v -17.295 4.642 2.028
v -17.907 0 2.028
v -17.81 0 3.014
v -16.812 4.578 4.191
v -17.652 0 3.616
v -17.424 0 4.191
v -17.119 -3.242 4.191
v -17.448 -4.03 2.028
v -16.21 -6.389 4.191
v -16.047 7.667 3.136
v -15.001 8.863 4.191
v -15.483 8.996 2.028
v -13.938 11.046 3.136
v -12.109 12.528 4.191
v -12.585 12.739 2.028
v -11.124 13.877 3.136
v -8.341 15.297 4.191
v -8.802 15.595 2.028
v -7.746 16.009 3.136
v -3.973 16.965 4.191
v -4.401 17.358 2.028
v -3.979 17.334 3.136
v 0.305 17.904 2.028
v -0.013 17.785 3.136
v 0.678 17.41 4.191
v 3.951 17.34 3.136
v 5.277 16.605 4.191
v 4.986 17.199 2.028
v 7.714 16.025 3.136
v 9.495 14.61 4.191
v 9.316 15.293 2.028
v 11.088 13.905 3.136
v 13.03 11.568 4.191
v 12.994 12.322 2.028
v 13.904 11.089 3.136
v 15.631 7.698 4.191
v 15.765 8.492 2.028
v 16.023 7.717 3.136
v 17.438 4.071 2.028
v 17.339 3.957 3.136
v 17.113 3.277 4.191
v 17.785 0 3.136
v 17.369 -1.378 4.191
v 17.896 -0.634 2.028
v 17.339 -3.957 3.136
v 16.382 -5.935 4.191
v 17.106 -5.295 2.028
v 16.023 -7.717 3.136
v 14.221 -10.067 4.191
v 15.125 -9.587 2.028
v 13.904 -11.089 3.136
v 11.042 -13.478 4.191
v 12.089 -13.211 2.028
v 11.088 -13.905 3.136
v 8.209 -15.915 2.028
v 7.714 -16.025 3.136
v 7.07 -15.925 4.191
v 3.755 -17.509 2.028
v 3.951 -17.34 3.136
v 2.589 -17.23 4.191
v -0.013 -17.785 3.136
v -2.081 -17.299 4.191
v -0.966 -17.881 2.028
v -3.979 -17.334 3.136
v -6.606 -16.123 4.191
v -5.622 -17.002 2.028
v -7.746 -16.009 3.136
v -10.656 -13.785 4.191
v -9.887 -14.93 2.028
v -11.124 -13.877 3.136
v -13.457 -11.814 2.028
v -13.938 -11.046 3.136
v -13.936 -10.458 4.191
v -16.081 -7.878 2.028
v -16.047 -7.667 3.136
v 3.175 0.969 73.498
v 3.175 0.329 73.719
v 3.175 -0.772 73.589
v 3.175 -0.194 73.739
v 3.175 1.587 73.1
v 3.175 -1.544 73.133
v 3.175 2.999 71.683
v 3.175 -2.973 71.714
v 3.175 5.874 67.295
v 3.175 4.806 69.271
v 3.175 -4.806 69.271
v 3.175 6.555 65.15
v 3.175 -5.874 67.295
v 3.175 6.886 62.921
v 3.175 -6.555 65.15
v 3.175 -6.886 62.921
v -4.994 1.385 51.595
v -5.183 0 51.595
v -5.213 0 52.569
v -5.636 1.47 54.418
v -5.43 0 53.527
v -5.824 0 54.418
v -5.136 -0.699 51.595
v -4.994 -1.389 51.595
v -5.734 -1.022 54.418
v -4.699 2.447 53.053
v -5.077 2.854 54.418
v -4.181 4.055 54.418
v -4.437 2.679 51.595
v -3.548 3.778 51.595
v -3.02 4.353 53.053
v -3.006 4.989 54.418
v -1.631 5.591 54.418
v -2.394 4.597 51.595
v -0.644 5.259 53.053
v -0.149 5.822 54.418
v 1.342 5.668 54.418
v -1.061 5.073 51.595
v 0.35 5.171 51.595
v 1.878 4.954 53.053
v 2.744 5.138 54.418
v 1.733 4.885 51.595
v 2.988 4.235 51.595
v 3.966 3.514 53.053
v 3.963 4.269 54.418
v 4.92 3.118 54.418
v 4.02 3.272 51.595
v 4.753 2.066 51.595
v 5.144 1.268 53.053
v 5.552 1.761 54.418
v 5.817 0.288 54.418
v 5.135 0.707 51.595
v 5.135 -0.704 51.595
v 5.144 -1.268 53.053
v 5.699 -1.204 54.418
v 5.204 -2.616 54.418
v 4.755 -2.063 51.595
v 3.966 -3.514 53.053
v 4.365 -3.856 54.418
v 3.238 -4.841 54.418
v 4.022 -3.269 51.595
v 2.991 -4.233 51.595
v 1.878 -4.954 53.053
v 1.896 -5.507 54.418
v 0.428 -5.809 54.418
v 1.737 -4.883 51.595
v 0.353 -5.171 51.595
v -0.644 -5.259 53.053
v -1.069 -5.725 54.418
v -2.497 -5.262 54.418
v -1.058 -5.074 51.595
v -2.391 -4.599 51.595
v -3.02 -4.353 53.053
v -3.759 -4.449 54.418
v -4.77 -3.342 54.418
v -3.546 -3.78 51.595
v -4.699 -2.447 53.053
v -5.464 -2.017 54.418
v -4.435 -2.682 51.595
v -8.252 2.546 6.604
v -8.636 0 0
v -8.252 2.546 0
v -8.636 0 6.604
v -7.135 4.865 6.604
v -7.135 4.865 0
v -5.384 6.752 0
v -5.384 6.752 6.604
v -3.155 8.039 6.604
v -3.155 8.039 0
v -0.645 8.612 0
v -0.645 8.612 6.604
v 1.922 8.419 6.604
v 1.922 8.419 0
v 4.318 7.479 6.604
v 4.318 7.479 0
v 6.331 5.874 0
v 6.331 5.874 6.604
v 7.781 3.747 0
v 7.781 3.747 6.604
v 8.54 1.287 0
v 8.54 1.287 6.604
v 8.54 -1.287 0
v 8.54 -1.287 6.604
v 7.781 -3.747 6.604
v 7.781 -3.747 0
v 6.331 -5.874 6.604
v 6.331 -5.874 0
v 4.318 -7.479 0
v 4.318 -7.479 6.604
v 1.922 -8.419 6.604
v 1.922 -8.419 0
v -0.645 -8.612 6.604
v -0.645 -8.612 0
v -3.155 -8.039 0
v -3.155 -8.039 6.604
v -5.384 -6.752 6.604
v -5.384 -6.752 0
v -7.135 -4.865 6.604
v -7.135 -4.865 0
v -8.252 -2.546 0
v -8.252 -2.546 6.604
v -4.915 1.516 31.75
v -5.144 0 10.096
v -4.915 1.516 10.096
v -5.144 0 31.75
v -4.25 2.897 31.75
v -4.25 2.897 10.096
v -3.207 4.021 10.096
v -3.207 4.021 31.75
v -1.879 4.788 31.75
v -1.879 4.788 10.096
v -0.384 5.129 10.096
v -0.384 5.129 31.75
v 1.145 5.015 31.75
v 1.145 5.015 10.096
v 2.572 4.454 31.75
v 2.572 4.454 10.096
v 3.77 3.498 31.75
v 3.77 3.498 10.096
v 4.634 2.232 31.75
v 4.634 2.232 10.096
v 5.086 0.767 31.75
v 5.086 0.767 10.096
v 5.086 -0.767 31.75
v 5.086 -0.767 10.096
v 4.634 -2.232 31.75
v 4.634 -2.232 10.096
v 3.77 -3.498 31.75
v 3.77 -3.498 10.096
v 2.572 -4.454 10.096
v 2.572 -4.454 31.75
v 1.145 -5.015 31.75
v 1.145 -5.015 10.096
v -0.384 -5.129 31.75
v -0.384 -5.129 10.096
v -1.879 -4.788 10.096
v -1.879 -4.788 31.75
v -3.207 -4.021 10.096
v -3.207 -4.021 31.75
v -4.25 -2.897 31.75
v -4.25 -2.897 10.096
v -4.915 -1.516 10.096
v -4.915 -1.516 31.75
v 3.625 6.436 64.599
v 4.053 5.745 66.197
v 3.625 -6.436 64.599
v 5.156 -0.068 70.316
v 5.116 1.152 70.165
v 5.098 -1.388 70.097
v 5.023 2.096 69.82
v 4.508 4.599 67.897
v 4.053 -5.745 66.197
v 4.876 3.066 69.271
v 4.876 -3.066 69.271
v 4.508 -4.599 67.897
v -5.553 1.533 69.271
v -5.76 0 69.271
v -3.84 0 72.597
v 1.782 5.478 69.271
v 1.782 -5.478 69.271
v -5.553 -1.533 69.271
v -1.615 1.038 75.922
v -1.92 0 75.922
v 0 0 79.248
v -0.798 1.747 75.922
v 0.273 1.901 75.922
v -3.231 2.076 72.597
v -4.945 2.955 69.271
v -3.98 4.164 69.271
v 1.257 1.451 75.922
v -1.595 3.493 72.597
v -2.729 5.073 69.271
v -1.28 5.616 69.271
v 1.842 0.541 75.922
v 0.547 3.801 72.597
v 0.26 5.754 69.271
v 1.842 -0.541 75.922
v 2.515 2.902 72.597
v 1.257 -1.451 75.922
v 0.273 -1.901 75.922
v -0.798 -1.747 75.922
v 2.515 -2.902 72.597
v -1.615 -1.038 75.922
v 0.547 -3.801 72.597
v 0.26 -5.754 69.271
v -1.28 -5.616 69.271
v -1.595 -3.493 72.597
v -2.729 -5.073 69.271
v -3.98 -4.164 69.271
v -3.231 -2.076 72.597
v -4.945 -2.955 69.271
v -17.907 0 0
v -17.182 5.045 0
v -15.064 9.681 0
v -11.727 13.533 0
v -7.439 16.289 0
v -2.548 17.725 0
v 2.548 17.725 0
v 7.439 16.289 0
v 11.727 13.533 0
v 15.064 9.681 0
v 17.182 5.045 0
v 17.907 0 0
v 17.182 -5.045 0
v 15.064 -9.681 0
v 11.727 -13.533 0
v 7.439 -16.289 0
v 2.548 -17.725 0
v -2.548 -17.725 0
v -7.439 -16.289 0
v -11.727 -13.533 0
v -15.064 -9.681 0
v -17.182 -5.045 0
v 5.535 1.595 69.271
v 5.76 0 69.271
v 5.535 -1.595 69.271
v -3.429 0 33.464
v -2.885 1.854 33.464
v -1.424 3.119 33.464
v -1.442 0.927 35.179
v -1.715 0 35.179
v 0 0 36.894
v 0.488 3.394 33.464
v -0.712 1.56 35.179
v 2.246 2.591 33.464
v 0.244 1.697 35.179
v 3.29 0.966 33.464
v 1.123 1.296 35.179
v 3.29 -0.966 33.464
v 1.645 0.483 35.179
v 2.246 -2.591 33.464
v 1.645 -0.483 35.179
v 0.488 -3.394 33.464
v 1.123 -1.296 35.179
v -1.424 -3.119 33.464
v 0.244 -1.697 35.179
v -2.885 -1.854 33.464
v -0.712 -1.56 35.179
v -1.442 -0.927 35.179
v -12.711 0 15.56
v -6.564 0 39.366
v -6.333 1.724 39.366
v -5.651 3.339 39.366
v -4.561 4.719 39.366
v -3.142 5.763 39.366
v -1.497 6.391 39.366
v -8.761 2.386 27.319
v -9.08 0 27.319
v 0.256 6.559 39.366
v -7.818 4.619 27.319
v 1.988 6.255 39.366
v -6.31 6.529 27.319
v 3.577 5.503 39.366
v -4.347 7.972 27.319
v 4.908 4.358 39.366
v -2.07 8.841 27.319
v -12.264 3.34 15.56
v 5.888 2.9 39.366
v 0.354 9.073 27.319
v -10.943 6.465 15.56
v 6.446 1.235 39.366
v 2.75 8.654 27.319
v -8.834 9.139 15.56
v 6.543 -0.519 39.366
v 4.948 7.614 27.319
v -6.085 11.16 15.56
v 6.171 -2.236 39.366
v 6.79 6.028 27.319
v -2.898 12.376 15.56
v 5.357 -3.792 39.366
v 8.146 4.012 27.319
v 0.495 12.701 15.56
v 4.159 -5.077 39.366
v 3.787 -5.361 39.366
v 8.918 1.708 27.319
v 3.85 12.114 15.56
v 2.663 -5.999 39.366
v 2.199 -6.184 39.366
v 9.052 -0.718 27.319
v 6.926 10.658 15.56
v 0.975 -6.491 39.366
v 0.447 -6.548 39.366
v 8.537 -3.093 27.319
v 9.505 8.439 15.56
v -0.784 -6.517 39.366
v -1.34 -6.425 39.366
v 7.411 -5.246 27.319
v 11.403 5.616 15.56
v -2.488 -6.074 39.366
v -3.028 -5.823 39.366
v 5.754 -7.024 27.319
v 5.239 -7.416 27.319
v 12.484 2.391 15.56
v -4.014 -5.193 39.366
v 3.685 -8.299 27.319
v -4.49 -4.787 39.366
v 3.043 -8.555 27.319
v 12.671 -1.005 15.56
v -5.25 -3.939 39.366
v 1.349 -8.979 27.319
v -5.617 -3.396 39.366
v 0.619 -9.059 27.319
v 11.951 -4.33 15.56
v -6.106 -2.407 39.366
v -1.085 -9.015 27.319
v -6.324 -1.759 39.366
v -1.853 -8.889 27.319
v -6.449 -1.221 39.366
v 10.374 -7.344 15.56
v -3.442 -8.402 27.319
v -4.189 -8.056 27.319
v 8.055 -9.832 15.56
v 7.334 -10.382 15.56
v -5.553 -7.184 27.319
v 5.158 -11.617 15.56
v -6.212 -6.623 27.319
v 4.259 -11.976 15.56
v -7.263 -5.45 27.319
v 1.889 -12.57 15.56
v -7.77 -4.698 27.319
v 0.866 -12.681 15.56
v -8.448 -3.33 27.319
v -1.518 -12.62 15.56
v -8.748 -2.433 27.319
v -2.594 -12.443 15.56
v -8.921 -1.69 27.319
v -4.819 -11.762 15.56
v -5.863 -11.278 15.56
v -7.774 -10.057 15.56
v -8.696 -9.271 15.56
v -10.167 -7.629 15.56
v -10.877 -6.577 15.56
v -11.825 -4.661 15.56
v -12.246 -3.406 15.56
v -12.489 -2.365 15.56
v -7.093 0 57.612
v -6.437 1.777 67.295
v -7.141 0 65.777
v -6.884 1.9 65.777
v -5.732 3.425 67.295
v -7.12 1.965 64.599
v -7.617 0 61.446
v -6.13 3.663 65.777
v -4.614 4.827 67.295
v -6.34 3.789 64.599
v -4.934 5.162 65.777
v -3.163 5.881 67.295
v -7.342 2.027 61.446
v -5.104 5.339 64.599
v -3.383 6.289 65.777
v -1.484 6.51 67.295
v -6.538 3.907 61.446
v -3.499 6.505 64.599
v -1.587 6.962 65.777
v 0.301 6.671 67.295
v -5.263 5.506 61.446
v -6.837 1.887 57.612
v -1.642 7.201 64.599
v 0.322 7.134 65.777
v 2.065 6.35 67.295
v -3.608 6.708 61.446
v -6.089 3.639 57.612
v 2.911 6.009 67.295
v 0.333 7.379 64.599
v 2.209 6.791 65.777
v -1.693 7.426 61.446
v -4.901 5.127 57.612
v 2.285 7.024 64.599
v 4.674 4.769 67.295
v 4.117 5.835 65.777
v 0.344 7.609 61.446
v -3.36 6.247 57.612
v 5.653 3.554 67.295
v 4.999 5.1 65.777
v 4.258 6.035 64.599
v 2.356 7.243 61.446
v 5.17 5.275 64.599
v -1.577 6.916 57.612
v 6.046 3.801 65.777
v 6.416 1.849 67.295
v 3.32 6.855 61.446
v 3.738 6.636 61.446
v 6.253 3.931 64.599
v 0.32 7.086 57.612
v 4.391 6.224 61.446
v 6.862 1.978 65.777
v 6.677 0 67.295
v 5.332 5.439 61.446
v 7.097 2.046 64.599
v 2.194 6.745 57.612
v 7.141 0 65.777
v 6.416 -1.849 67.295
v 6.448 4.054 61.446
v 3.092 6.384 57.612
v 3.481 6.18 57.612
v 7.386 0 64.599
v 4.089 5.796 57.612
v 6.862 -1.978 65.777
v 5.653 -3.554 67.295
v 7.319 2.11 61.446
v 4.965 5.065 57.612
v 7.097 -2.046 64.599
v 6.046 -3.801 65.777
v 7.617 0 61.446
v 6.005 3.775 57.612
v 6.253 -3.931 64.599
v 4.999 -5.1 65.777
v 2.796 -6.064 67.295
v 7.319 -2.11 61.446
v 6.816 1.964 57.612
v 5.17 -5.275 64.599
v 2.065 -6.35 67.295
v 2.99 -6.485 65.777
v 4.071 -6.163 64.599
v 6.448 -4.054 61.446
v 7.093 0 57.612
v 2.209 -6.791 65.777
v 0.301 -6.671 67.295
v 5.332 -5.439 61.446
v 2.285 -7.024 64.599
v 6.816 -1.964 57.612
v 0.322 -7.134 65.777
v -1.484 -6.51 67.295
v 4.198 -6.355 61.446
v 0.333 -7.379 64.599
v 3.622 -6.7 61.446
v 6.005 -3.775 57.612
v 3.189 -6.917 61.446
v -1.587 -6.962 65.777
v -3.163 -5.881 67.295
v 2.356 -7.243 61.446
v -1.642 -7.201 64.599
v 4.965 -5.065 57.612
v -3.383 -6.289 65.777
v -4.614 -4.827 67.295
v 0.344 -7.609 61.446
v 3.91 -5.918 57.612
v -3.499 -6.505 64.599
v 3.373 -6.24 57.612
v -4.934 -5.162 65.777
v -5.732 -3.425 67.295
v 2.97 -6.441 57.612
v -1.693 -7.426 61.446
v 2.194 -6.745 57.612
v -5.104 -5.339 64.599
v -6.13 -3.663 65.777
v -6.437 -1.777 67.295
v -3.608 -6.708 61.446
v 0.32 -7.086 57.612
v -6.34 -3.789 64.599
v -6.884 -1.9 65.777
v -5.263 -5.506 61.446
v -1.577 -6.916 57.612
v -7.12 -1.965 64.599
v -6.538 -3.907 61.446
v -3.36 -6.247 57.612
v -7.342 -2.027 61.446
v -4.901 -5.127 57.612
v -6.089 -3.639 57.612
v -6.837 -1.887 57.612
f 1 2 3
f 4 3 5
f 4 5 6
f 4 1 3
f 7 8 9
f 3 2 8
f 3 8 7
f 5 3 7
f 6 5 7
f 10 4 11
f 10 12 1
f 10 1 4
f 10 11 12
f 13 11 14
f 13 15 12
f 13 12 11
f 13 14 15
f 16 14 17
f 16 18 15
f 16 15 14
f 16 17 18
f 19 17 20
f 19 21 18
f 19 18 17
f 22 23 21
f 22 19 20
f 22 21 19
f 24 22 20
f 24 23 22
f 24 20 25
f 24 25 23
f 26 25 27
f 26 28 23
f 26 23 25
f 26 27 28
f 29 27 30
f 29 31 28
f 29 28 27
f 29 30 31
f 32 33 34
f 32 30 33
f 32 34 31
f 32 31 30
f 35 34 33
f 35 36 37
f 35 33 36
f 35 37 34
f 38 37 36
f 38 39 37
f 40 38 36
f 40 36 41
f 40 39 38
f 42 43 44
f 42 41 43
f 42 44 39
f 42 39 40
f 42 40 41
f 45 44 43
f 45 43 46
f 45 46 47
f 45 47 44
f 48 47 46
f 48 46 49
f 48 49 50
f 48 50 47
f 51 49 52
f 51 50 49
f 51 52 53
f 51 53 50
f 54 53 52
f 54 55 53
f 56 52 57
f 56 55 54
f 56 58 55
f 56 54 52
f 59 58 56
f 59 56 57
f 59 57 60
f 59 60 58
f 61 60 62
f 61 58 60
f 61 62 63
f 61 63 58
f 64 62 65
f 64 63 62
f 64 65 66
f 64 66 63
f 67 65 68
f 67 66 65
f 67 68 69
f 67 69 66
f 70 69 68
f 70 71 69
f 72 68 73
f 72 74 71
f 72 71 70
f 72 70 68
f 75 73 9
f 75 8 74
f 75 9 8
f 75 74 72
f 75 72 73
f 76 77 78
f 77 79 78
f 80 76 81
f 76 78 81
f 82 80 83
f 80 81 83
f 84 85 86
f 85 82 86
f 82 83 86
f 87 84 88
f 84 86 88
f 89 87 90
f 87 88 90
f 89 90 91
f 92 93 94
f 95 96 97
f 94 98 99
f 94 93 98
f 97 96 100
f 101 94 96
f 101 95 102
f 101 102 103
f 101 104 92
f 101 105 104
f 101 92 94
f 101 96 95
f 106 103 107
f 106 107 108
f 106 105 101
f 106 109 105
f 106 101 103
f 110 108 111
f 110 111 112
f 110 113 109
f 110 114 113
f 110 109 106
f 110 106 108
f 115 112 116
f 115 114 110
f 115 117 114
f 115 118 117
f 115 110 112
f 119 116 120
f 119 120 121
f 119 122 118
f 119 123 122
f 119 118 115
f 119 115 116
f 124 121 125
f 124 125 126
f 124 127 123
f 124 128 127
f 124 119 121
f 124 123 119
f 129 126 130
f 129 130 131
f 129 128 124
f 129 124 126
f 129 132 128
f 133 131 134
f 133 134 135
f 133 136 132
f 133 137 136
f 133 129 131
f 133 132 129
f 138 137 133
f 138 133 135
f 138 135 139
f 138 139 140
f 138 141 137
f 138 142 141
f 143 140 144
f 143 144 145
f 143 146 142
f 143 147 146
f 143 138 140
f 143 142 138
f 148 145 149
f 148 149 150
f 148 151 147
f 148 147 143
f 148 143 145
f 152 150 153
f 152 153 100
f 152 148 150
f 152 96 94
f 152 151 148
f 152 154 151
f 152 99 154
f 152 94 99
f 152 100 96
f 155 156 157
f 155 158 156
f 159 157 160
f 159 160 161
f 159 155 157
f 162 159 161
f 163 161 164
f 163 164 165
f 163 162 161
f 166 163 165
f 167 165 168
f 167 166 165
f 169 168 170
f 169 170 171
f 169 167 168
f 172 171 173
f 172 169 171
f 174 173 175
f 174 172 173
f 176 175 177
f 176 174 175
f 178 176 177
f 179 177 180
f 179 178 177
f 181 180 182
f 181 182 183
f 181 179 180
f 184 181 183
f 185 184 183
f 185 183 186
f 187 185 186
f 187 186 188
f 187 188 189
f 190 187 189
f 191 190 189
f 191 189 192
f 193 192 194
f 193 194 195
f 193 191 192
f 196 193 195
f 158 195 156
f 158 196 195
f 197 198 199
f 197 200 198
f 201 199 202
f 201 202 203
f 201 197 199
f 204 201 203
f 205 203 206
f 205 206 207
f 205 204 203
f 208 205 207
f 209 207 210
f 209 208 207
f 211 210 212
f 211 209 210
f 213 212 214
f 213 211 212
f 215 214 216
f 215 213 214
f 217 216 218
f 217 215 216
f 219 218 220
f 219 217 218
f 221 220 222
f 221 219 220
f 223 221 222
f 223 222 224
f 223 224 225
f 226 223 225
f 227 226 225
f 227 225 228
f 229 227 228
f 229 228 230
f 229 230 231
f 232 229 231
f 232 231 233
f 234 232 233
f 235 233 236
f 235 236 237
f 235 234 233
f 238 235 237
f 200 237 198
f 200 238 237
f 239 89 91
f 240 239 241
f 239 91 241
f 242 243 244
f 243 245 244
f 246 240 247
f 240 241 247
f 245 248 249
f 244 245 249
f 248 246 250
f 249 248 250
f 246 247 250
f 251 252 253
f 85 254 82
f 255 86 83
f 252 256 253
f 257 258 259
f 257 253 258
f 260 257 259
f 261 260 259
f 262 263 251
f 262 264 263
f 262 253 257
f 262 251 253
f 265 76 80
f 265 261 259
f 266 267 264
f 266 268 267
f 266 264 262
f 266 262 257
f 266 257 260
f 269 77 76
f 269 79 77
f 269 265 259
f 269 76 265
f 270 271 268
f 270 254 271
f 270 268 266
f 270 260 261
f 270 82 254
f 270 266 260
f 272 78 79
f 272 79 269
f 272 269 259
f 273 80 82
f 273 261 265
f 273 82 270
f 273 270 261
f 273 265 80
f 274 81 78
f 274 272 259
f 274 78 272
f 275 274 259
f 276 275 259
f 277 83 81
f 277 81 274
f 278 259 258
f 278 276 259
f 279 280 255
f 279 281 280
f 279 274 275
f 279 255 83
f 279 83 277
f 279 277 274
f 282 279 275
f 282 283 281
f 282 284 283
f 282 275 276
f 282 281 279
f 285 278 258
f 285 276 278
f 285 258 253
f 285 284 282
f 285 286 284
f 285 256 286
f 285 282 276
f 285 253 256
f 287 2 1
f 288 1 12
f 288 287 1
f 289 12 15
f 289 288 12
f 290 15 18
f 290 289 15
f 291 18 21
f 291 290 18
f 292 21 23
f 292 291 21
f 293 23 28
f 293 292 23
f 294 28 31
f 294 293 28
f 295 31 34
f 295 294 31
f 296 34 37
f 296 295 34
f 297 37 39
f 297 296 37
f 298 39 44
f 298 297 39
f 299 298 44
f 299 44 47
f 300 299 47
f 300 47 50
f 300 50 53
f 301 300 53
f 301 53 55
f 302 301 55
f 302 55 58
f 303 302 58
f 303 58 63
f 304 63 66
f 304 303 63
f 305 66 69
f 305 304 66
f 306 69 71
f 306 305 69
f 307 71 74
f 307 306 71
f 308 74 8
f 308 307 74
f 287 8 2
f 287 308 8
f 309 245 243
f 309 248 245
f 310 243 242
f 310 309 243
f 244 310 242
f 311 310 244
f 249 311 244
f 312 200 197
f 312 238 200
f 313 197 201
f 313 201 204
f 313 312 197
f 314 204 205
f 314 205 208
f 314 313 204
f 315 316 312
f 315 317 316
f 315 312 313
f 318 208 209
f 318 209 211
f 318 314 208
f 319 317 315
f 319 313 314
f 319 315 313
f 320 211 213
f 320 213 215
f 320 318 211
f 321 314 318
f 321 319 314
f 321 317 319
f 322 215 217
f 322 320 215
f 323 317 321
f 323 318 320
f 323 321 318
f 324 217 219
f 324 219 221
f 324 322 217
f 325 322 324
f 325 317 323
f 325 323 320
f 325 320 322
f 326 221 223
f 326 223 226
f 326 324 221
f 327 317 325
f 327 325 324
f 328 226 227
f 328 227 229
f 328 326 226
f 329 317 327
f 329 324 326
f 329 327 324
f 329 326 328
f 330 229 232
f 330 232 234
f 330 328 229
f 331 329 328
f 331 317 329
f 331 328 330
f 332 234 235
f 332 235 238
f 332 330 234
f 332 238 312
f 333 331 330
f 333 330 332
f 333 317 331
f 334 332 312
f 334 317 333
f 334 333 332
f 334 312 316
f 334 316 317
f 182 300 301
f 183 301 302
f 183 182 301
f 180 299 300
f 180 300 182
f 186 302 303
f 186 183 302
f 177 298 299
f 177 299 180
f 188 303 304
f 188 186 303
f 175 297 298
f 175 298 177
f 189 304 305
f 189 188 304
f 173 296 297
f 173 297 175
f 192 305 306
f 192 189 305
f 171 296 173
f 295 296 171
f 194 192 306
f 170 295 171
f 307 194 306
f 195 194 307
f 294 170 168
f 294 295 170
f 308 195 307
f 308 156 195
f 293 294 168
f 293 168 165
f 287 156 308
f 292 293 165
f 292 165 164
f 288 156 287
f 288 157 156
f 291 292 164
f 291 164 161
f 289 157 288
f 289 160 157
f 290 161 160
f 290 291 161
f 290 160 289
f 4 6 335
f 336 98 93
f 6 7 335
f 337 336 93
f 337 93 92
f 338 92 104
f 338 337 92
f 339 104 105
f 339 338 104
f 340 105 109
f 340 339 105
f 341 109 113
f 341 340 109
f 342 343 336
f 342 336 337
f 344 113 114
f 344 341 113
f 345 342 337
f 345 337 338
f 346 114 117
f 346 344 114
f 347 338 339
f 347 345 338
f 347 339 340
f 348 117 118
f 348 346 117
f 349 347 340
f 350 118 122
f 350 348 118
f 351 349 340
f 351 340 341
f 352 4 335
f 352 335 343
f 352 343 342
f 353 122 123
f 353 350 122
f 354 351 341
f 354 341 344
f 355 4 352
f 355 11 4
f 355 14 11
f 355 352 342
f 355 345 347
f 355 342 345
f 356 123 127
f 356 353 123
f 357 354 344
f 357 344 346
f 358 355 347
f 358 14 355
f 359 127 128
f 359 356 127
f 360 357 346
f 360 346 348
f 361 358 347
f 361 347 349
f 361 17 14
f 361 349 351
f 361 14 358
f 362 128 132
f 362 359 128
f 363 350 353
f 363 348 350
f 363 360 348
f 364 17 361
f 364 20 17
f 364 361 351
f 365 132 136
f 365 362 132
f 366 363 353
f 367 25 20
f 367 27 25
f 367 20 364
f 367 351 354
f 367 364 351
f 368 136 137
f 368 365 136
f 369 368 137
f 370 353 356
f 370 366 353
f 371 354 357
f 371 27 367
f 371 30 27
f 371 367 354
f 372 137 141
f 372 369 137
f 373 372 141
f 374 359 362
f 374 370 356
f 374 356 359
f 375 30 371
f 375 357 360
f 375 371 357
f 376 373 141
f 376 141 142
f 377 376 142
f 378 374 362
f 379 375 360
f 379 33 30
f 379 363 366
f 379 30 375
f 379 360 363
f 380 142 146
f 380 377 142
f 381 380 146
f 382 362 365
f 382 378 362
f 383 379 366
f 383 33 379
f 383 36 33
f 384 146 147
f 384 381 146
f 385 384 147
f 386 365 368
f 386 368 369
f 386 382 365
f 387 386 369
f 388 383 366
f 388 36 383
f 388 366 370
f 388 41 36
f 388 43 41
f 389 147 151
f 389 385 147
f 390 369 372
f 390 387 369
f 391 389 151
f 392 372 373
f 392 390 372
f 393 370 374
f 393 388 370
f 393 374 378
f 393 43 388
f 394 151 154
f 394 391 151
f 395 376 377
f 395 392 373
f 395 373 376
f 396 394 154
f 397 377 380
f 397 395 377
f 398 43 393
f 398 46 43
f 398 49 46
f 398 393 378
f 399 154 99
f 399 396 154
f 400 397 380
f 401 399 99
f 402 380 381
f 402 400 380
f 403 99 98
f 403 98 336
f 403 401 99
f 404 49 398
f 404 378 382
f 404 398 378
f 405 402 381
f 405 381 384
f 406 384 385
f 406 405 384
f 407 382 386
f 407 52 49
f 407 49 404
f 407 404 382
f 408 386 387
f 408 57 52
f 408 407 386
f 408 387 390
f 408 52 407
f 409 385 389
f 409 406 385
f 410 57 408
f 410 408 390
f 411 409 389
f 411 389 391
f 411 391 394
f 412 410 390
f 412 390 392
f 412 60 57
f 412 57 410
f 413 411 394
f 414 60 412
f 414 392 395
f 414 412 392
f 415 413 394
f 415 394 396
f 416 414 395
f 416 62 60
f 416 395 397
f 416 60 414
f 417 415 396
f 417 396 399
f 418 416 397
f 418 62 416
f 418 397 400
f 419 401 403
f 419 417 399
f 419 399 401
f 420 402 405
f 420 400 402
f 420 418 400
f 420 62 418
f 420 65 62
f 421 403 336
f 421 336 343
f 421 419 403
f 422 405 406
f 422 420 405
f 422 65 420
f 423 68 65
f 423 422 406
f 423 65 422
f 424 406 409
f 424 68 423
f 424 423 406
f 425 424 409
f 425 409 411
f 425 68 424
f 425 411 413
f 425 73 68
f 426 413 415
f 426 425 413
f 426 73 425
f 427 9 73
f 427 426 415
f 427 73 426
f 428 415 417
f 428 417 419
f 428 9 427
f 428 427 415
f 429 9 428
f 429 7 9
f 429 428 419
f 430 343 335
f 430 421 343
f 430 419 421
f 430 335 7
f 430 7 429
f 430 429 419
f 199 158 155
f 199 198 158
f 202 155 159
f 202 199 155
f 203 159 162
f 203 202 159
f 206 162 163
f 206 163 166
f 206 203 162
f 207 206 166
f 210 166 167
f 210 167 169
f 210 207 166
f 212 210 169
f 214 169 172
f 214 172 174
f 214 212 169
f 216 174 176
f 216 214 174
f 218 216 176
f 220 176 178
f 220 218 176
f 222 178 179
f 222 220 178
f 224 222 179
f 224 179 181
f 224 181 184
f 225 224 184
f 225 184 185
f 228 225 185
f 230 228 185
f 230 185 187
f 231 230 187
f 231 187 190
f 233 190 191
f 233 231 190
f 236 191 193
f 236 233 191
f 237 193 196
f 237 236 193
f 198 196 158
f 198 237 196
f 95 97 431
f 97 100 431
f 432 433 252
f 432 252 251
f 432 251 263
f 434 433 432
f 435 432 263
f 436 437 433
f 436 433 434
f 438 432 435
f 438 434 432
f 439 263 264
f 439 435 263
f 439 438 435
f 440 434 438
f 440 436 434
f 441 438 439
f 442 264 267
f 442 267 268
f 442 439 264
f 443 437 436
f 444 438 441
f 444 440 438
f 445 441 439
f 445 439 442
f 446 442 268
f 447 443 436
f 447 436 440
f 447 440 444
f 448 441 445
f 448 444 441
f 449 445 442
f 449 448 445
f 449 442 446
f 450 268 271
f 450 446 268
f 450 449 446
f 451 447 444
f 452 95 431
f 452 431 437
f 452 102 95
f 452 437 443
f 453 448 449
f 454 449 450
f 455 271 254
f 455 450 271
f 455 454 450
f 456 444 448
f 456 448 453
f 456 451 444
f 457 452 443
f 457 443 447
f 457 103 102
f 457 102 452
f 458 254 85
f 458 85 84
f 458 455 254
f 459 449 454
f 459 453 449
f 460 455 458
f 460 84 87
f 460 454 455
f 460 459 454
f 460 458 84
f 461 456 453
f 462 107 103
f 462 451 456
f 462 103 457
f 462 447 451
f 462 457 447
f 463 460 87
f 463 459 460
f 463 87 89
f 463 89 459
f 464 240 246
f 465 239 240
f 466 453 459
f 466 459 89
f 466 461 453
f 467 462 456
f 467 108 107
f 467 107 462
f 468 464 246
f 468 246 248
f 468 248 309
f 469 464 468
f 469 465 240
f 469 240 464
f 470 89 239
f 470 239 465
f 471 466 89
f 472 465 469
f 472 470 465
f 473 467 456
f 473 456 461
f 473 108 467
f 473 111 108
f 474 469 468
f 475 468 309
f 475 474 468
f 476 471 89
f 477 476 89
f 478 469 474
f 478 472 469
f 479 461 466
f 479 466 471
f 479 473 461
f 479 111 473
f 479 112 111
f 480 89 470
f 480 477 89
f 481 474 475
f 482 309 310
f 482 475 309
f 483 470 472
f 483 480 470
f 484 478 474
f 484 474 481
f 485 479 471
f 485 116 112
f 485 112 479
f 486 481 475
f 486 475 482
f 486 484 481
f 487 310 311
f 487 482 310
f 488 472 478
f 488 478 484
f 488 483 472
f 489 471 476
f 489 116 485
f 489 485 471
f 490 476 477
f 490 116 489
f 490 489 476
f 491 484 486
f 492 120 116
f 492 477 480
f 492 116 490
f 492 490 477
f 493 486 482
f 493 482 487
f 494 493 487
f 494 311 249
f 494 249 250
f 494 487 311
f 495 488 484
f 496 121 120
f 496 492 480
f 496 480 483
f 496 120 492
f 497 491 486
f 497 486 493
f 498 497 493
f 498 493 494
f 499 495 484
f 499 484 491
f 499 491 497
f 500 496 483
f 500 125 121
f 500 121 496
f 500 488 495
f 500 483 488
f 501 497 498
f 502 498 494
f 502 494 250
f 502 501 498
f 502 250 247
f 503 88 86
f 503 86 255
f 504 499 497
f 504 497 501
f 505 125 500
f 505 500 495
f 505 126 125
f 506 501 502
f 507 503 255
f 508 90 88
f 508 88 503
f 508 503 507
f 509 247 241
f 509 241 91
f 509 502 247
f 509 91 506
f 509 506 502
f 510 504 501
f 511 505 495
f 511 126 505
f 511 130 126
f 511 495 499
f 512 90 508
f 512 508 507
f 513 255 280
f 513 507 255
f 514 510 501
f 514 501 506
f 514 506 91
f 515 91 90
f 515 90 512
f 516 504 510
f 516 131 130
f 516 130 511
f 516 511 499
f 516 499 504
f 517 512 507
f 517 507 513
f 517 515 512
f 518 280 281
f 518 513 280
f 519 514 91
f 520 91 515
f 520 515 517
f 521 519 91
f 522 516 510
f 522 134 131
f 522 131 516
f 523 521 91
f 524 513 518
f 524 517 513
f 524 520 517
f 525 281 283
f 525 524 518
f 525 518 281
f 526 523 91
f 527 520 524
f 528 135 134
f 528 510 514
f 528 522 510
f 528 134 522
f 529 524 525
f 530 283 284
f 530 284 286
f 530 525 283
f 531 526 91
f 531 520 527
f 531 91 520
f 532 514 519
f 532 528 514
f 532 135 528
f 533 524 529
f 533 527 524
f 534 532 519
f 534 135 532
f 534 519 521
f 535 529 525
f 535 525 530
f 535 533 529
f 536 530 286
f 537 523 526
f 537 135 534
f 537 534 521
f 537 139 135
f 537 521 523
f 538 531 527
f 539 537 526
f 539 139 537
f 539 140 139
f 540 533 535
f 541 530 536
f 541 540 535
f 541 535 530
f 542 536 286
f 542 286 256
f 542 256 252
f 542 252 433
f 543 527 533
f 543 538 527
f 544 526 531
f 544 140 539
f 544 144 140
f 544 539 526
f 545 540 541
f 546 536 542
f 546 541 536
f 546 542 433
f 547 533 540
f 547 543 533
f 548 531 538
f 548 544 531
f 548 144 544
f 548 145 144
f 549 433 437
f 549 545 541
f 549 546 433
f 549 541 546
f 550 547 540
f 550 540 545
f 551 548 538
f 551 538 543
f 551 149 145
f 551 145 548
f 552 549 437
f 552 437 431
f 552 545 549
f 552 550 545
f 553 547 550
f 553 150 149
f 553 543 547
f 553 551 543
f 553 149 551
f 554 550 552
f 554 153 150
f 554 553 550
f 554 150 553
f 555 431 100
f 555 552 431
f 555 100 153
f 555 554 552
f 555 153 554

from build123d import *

# Parameters (mm, degrees)
F3_DEPTH = 12.7
F4_R     = 5.08


with BuildPart() as f1:
    # F0 (on Front) → F1 (revolve)
    with BuildSketch(Plane.XZ):
        with BuildLine():
            Line((-17.907, 3.175), (-17.907, 0))
            Line((-17.907, 0), (-8.636, 0))
            Line((-8.636, 0), (-8.636, 6.604))
            Line((-8.636, 6.604), (-5.1435, 10.0965))
            Line((-5.1435, 10.0965), (-5.1435, 31.75))
            Line((-5.1435, 31.75), (0, 36.8935))
            Line((0, 36.8935), (0, 79.248))
            Line((0, 79.248), (-5.7601785687, 69.2710780584))
            add(Edge.make_bspline(
                [(-5.7601785687, 69.2710780584), (-10.6664197671, 60.7732190285), (-5.0834936393, 53.2736577196)],
                knots=[0.8570719479, 0.8570719479, 0.8570719479, 2.4112497087, 2.4112497087, 2.4112497087], degree=2, weights=[1, 0.7129578532, 1]))
            ThreePointArc((-5.0834936393, 53.2736577196), (-9.0107667422, 27.5883887463), (-17.907, 3.175))
        make_face()
    revolve(axis=Axis((0, 0, 18.44675), (0, 0, -1)))

    # F2 (on Front) → F3 (cut, symmetric)
    with BuildSketch(Plane.XZ):
        Polygon((7.2810413163, 78.2450328688), (3.175, 79.0126742409), (3.175, 62.9210780584), align=None)
    extrude(amount=F3_DEPTH, both=True, mode=Mode.SUBTRACT)

    # F4
    f4_edges = [f1.edges().sort_by_distance(p)[0] for p in [
        (5.083494, 0, 53.273658),
        (17.907, 0, 3.175),
    ]]
    fillet(f4_edges, radius=F4_R)


solid = f1.part
